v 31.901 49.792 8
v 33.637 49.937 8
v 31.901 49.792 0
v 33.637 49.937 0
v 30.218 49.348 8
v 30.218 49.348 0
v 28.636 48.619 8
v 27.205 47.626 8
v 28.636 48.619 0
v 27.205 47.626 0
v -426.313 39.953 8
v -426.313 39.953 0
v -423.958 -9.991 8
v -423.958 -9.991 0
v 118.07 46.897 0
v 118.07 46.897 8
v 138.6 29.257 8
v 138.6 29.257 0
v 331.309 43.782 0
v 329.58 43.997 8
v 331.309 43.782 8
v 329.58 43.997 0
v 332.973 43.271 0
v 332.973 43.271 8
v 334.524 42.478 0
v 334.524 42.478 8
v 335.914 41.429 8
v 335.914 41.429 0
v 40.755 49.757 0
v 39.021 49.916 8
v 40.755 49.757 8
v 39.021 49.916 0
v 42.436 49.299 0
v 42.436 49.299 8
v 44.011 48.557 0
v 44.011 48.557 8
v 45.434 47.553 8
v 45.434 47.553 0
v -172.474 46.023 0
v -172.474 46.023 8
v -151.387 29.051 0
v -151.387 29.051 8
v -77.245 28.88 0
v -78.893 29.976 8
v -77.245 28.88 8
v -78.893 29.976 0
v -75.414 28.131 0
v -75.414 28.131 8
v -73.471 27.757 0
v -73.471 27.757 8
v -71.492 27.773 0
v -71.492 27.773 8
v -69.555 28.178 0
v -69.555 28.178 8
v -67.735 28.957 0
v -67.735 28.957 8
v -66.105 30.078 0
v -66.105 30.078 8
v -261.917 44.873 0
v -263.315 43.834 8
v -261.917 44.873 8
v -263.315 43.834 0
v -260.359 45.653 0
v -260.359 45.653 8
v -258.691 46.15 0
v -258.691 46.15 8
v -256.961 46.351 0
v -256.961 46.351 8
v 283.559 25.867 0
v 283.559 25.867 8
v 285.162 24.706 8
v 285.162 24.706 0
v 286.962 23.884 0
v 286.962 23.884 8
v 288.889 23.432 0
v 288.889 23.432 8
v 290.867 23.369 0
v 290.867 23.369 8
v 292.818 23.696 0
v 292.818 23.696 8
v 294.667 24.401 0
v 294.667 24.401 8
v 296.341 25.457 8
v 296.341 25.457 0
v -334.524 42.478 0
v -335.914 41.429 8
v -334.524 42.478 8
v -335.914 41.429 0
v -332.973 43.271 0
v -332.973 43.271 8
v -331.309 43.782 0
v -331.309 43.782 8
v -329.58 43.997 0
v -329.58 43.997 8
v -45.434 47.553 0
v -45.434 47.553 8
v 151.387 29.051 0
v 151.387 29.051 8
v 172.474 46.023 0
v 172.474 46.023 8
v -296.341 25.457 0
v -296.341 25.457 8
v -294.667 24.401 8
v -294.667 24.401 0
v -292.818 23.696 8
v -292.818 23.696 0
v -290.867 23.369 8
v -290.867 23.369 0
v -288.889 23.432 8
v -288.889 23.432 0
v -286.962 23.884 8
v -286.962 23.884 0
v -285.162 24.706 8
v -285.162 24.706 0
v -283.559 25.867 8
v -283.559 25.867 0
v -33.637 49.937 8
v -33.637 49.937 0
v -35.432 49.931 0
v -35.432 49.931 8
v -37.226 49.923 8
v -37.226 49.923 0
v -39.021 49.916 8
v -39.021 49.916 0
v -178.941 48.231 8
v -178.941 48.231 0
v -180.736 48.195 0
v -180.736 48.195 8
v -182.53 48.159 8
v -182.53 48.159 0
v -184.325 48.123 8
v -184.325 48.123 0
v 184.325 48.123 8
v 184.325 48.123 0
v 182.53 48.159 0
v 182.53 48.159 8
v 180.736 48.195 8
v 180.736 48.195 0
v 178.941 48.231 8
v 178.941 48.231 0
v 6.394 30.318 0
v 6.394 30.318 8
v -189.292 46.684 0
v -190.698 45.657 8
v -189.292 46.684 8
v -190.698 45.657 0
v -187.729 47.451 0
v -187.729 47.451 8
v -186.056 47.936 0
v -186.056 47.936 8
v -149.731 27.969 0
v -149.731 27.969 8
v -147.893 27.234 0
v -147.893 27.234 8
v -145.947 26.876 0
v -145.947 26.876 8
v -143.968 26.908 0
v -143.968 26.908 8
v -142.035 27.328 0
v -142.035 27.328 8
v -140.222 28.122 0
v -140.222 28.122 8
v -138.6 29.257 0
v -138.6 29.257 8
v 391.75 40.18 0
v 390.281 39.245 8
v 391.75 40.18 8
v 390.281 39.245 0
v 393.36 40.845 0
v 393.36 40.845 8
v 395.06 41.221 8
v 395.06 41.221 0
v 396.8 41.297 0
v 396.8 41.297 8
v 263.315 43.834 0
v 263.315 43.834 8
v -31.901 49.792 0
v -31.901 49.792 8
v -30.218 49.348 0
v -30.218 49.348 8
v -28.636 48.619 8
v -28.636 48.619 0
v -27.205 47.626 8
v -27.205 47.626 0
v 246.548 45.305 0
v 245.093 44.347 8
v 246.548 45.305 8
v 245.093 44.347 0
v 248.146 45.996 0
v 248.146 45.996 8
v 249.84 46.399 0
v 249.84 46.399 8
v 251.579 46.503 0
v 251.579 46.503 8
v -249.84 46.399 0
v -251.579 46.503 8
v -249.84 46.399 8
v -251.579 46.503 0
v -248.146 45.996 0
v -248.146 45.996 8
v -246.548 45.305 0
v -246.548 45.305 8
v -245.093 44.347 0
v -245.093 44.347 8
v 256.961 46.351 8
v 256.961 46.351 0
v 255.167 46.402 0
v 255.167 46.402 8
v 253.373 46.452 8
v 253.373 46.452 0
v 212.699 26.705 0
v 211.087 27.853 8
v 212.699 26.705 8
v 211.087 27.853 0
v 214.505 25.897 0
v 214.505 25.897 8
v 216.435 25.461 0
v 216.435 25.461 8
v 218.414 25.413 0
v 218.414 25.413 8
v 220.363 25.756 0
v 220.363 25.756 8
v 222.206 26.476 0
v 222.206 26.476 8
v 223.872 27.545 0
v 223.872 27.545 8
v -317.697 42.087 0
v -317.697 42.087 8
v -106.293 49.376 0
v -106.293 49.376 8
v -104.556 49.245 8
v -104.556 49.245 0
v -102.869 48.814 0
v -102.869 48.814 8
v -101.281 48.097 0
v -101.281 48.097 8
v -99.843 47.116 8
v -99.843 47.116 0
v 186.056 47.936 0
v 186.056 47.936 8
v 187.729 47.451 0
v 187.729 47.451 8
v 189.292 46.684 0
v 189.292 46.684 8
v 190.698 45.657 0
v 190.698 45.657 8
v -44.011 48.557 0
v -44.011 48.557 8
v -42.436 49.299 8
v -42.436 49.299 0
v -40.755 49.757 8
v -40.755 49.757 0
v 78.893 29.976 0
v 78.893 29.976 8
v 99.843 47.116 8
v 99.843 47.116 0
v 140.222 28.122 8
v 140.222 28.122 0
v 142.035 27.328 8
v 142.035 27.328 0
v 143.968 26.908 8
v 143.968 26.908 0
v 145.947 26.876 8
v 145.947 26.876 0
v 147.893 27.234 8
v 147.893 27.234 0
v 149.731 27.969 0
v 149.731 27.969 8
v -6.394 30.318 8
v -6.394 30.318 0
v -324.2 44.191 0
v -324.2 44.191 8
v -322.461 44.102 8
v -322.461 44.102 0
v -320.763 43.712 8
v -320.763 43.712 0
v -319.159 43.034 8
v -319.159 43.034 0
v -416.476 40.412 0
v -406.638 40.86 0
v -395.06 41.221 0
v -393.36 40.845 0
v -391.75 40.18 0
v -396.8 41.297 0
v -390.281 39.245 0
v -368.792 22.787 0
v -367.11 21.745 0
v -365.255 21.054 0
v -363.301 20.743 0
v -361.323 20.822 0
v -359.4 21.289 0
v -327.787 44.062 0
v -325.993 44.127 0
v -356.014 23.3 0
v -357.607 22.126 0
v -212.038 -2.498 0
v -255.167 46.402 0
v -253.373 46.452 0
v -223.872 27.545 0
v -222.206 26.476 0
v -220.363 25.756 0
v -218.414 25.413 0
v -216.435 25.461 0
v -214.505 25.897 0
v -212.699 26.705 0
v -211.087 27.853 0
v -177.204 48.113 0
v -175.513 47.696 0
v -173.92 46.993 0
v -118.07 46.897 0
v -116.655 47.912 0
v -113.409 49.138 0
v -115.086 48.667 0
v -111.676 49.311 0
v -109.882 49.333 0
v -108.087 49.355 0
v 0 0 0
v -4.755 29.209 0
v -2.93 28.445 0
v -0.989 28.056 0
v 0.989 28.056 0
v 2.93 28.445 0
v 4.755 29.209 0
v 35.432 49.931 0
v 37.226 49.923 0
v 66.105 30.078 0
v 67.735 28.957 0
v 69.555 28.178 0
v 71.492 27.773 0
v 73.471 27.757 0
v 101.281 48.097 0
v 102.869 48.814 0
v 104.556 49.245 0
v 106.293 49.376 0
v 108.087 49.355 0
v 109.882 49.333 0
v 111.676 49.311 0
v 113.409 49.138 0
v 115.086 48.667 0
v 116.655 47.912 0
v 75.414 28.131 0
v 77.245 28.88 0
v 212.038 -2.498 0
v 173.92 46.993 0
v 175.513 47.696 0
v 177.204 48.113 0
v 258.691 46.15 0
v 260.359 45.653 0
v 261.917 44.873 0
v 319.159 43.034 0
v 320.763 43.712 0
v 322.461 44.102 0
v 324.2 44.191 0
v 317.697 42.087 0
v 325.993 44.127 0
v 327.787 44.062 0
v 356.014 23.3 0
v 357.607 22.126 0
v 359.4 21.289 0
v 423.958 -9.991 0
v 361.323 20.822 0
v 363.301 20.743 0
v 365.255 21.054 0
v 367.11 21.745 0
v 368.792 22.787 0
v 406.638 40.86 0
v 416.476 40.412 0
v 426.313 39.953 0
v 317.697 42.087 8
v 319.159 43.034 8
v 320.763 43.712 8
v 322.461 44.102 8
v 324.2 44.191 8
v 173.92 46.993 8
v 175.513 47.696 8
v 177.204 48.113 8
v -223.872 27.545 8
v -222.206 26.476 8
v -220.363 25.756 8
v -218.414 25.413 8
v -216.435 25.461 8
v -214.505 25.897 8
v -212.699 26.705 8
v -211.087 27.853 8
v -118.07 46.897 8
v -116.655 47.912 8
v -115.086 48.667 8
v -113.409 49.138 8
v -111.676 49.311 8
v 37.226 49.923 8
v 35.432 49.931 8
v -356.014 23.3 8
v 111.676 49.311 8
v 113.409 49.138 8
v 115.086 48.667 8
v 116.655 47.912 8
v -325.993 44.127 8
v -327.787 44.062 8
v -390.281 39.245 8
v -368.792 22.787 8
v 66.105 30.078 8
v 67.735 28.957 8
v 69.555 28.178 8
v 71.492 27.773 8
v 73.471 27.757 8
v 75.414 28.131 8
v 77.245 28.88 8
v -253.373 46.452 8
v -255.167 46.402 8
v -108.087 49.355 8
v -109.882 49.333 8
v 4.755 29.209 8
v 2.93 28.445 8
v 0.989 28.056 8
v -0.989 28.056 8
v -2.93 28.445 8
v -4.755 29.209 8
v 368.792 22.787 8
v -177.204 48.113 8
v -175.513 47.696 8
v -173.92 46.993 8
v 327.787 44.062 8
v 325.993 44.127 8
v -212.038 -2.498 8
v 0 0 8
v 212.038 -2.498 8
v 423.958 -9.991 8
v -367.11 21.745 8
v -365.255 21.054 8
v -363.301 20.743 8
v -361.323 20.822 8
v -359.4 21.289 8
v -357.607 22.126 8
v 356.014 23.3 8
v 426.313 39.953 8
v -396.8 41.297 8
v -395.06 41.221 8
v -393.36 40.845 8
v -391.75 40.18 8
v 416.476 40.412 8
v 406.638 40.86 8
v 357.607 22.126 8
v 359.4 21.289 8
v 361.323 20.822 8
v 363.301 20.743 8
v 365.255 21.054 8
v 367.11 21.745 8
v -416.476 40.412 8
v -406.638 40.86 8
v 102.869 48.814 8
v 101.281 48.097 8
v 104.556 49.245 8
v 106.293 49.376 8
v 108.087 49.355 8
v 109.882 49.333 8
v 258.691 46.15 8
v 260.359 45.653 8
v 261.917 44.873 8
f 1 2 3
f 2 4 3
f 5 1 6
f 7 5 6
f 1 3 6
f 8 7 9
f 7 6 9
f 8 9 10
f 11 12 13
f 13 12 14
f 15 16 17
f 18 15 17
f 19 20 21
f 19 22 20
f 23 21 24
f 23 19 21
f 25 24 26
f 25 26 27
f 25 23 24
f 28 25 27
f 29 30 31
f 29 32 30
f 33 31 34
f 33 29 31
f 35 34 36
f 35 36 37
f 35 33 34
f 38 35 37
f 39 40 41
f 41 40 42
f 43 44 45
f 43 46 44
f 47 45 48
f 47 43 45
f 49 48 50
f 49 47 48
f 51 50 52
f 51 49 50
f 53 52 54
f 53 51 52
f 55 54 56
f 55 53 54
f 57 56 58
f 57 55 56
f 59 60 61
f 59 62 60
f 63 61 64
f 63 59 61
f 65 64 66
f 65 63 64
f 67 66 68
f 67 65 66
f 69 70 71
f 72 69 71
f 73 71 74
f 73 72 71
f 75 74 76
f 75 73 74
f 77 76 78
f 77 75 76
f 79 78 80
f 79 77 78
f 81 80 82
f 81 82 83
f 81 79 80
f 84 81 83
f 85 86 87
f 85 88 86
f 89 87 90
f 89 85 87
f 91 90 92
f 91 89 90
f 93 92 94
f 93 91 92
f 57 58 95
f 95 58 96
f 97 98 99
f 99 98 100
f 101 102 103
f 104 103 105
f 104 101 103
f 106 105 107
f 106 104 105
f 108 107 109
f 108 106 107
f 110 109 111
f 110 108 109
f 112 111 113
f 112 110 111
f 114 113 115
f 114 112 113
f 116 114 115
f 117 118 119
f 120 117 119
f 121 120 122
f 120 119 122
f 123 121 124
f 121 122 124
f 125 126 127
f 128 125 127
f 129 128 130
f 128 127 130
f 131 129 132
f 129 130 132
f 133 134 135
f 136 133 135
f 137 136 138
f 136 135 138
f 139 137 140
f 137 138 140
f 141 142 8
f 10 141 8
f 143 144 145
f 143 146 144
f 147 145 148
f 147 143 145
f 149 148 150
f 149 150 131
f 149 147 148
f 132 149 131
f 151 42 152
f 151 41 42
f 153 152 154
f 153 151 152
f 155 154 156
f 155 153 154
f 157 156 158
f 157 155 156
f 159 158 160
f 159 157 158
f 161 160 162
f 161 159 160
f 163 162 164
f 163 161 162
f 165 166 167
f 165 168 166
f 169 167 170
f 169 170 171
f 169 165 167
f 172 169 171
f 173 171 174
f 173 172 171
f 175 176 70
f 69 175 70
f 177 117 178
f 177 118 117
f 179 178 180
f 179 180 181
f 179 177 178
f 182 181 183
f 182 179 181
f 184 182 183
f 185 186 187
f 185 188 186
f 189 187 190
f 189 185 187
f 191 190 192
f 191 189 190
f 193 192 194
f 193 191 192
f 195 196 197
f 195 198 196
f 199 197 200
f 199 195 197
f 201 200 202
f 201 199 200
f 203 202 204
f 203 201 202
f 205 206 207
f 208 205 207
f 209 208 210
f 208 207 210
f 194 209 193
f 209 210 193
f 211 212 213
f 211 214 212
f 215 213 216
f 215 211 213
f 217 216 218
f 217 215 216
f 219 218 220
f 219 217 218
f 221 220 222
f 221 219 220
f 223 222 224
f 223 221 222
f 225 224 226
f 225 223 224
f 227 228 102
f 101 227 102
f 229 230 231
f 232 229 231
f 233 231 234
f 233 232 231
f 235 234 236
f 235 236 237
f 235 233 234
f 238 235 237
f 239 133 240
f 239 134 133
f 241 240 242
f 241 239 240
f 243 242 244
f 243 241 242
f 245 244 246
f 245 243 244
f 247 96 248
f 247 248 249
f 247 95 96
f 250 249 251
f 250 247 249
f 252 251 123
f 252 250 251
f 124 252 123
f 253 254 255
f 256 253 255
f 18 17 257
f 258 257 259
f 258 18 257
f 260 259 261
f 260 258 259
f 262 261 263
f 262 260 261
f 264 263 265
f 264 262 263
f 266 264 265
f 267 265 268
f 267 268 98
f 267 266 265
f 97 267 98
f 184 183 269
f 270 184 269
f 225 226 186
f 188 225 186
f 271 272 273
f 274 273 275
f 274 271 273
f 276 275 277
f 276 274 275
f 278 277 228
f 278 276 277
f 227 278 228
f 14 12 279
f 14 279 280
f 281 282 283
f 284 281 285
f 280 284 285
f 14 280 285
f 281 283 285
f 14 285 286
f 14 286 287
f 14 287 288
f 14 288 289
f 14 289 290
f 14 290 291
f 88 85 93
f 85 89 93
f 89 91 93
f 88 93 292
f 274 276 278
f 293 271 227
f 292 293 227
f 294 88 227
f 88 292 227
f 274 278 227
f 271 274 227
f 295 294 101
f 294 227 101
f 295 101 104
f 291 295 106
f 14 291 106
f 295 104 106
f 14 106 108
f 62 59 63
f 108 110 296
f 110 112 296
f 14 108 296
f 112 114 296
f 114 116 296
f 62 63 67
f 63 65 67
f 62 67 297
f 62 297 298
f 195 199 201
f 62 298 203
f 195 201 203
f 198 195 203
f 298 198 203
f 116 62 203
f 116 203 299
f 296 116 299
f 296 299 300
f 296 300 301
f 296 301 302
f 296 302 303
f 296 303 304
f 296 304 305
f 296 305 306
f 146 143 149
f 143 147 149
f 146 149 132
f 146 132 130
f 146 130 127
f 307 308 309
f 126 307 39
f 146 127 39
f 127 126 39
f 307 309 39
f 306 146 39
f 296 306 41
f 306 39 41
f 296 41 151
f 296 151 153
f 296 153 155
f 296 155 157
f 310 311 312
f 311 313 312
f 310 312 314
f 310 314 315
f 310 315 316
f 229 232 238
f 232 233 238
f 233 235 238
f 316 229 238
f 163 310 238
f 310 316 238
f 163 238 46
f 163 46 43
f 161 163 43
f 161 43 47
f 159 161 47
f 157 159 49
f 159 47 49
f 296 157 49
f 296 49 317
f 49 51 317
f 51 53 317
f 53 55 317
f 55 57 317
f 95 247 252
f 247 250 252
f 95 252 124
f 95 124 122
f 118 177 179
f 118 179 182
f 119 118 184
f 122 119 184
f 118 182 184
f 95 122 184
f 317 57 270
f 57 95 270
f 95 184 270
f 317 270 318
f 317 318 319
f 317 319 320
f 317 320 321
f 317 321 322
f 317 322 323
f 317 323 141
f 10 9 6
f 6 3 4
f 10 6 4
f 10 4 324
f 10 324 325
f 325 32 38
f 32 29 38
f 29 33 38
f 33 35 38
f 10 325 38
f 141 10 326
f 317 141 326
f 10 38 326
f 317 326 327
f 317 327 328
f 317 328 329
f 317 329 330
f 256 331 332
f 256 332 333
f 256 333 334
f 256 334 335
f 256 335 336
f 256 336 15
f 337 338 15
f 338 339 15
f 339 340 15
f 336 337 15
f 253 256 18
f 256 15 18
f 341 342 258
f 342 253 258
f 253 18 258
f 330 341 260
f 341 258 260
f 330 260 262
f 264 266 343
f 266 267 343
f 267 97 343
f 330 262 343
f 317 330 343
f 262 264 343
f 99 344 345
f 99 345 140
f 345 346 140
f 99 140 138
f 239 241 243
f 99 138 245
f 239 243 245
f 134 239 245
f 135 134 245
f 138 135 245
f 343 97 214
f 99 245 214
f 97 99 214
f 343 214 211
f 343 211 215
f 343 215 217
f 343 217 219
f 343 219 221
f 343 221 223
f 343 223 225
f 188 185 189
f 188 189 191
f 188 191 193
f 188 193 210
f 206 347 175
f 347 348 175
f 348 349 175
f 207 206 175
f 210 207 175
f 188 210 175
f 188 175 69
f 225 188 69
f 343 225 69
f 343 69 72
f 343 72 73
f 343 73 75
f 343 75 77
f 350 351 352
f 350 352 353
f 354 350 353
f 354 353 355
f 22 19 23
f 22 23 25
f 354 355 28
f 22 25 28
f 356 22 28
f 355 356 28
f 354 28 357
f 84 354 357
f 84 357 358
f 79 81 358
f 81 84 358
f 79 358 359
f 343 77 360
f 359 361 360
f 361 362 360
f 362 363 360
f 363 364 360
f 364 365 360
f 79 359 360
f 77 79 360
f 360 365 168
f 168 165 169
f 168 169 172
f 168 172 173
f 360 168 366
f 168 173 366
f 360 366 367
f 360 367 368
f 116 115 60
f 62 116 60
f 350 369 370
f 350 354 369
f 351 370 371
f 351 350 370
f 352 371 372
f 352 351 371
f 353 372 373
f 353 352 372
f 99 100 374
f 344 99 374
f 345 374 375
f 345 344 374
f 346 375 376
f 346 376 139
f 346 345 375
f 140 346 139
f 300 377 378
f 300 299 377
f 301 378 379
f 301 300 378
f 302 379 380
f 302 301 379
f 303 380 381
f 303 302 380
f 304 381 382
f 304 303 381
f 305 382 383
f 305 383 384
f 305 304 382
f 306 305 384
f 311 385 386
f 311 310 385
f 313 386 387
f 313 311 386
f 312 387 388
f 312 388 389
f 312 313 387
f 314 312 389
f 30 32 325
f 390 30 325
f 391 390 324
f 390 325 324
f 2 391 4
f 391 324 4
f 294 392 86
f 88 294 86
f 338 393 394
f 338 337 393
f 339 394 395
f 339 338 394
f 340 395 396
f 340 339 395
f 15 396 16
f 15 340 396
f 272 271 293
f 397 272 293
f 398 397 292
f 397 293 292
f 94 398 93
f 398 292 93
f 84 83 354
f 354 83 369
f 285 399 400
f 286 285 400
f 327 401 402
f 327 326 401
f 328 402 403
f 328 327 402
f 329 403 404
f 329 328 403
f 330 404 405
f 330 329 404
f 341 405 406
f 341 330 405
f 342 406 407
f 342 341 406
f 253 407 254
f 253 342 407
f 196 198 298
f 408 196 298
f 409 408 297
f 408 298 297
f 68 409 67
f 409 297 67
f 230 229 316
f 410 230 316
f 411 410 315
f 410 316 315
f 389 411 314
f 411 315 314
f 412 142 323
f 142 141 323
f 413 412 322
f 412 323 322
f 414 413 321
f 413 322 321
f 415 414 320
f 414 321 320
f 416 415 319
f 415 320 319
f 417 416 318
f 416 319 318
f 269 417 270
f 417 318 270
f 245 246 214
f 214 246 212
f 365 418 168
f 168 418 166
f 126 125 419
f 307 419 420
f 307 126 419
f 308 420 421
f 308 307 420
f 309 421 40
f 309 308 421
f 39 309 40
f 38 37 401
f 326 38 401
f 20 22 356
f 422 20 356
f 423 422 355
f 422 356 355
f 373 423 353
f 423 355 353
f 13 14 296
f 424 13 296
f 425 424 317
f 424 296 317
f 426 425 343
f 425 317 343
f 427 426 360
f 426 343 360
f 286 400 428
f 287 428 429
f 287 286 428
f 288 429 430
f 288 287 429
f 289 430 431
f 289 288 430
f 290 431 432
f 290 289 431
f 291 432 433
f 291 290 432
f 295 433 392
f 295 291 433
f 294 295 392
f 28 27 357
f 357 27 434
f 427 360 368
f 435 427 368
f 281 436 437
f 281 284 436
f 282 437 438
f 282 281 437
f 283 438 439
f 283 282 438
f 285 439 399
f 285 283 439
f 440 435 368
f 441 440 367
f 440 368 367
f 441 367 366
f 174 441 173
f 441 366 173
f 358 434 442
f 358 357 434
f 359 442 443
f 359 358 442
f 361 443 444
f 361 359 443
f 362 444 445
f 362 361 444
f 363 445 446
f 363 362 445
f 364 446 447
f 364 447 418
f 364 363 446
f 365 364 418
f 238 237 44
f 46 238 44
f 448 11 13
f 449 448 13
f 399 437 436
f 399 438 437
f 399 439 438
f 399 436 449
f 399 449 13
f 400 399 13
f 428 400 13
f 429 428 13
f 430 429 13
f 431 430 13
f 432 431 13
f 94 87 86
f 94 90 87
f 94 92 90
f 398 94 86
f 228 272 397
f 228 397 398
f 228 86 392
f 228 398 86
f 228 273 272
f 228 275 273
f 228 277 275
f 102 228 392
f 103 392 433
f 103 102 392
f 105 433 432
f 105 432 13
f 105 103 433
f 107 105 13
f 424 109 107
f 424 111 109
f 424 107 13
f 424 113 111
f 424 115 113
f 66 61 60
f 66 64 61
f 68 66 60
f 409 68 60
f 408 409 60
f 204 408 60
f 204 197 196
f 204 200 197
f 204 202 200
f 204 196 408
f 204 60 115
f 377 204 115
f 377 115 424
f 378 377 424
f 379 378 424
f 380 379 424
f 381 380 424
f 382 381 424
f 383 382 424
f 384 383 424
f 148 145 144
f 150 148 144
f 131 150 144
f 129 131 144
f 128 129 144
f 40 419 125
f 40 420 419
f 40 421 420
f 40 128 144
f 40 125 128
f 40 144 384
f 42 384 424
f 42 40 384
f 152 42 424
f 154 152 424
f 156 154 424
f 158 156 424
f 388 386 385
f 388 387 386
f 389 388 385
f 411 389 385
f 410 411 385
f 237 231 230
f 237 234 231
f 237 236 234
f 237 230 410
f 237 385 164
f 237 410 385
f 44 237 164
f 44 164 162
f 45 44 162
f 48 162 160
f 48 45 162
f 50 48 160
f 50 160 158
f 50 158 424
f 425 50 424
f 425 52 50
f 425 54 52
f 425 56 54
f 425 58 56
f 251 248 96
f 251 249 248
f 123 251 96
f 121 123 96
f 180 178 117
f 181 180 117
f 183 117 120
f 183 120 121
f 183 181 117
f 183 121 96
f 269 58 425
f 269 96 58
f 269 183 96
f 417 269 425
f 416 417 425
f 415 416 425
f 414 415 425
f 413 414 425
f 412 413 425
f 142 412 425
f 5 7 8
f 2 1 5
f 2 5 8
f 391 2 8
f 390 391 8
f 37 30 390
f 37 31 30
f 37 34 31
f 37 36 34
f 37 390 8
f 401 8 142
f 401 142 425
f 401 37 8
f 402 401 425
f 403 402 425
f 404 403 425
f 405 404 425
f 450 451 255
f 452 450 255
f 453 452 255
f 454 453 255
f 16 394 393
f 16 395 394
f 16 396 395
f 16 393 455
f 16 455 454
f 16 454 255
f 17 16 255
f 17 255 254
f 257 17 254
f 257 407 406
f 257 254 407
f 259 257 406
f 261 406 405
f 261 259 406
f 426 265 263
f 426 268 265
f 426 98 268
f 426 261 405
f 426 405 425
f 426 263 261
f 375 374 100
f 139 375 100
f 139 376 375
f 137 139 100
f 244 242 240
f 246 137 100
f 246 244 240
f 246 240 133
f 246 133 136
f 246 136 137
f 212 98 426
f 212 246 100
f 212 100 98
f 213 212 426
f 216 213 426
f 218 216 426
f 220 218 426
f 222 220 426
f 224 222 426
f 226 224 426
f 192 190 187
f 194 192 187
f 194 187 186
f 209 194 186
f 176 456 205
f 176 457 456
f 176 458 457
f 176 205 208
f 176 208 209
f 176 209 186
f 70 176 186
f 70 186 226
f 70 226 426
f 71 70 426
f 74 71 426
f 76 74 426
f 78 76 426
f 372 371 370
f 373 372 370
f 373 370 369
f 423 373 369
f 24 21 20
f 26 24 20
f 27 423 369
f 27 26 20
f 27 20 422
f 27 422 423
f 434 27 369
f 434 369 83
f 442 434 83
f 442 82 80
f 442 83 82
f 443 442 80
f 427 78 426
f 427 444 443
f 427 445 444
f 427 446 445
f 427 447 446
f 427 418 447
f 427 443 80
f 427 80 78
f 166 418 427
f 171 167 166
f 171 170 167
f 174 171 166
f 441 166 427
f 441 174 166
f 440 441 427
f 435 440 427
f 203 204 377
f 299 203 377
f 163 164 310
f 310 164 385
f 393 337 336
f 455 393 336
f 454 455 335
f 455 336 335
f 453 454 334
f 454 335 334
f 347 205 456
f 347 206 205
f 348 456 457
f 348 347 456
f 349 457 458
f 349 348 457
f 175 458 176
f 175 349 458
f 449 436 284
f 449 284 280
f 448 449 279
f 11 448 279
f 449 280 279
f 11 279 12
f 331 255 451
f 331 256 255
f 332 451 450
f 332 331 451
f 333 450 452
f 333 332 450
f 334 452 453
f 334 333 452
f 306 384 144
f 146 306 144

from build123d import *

# Parameters (mm, degrees)
BOSS_EXTRU_2_DEPTH                 = 8
ENL_V_MAT_EXTRU_1_DEPTH            = 9
CONG_1_R                           = 10
R_P_TITION_CIRCULAIRE1_COUNT       = 6
R_P_TITION_CIRCULAIRE1_ANGLE       = 2.3
CONG_1_OF_R_P_TITION_CIRCULAIRE1_R = 10
R_P_TITION_CIRCULAIRE2_COUNT       = 6
R_P_TITION_CIRCULAIRE2_ANGLE       = 2.3
CONG_1_OF_R_P_TITION_CIRCULAIRE2_R = 10


with BuildPart() as part:
    # Esquisse1 → Boss.-Extru.2 (new body)
    with BuildSketch(Plane.XY):
        with BuildLine():
            Line((423.958056387, -9.991125342), (426.313378922, 39.953368406))
            ThreePointArc((426.313378922, 39.953368406), (0, 50), (-426.313378922, 39.953368406))
            Line((-426.313378922, 39.953368406), (-423.958056387, -9.991125342))
            ThreePointArc((-423.958056387, -9.991125342), (0, 0), (423.958056387, -9.991125342))
        make_face()
    extrude(amount=BOSS_EXTRU_2_DEPTH)

    # Esquisse2 → Enlèv. mat.-Extru.1 (cut, through all)
    with BuildSketch(Plane.XY.offset(8)):
        Polygon((0, 25), (30, 49.950276106), (0, 74.995327729), (-30, 49.950276106), align=None)
    enl_v_mat_extru_1 = extrude(amount=-ENL_V_MAT_EXTRU_1_DEPTH, mode=Mode.SUBTRACT)

    # Congé1
    cong_1_edges = [part.edges().sort_by_distance(p)[0] for p in [
        (0, 25, 4),
        (-30, 49.950276106, 4),
        (30, 49.950276106, 4),
    ]]
    fillet(cong_1_edges, radius=CONG_1_R)

    # Répétition circulaire1: Enlèv. mat.-Extru.1 ×6 about axis
    r_p_tition_circulaire1_axis = Axis((0, -9000, 0), (0, 0, 1))
    for i in range(1, R_P_TITION_CIRCULAIRE1_COUNT):
        add(enl_v_mat_extru_1.rotate(r_p_tition_circulaire1_axis, i * R_P_TITION_CIRCULAIRE1_ANGLE / (R_P_TITION_CIRCULAIRE1_COUNT - 1)), mode=Mode.SUBTRACT)

    # Congé1 of Répétition circulaire1
    cong_1_of_r_p_tition_circulaire1_edges = [part.edges().sort_by_distance(p)[0] for p in [
        (-72.456565501, 24.709139142, 4),
        (-102.655910154, 49.417758293, 4),
        (-42.657843855, 49.899463992, 4),
        (-144.908460692, 23.836575317, 4),
        (-175.305203447, 48.301944876, 4),
        (-115.312938126, 49.265325224, 4),
        (-217.351015561, 22.382364766, 4),
        (-247.943197144, 46.602907776, 4),
        (-187.960599706, 48.047900678, 4),
        (-289.779560701, 20.346601223, 4),
        (-320.565209242, 44.320756509, 4),
        (-260.596145965, 46.247268824, 4),
        (-362.189427606, 17.729415908, 4),
        (-393.166558764, 41.455638174, 4),
        (-333.214895057, 43.863545726, 4),
    ]]
    fillet(cong_1_of_r_p_tition_circulaire1_edges, radius=CONG_1_OF_R_P_TITION_CIRCULAIRE1_R)

    # Répétition circulaire2: Enlèv. mat.-Extru.1 ×6 about axis
    r_p_tition_circulaire2_axis = Axis((0, -9000, 0), (0, 0, -1))
    for i in range(1, R_P_TITION_CIRCULAIRE2_COUNT):
        add(enl_v_mat_extru_1.rotate(r_p_tition_circulaire2_axis, i * R_P_TITION_CIRCULAIRE2_ANGLE / (R_P_TITION_CIRCULAIRE2_COUNT - 1)), mode=Mode.SUBTRACT)

    # Congé1 of Répétition circulaire2
    cong_1_of_r_p_tition_circulaire2_edges = [part.edges().sort_by_distance(p)[0] for p in [
        (72.456565501, 24.709139142, 4),
        (42.657843855, 49.899463992, 4),
        (102.655910154, 49.417758293, 4),
        (144.908460692, 23.836575317, 4),
        (115.312938126, 49.265325224, 4),
        (175.305203447, 48.301944876, 4),
        (217.351015561, 22.382364766, 4),
        (187.960599706, 48.047900678, 4),
        (247.943197144, 46.602907776, 4),
        (289.779560701, 20.346601223, 4),
        (260.596145965, 46.247268824, 4),
        (320.565209242, 44.320756509, 4),
        (362.189427606, 17.729415908, 4),
        (333.214895057, 43.863545726, 4),
        (393.166558764, 41.455638174, 4),
    ]]
    fillet(cong_1_of_r_p_tition_circulaire2_edges, radius=CONG_1_OF_R_P_TITION_CIRCULAIRE2_R)


solid = part.part
